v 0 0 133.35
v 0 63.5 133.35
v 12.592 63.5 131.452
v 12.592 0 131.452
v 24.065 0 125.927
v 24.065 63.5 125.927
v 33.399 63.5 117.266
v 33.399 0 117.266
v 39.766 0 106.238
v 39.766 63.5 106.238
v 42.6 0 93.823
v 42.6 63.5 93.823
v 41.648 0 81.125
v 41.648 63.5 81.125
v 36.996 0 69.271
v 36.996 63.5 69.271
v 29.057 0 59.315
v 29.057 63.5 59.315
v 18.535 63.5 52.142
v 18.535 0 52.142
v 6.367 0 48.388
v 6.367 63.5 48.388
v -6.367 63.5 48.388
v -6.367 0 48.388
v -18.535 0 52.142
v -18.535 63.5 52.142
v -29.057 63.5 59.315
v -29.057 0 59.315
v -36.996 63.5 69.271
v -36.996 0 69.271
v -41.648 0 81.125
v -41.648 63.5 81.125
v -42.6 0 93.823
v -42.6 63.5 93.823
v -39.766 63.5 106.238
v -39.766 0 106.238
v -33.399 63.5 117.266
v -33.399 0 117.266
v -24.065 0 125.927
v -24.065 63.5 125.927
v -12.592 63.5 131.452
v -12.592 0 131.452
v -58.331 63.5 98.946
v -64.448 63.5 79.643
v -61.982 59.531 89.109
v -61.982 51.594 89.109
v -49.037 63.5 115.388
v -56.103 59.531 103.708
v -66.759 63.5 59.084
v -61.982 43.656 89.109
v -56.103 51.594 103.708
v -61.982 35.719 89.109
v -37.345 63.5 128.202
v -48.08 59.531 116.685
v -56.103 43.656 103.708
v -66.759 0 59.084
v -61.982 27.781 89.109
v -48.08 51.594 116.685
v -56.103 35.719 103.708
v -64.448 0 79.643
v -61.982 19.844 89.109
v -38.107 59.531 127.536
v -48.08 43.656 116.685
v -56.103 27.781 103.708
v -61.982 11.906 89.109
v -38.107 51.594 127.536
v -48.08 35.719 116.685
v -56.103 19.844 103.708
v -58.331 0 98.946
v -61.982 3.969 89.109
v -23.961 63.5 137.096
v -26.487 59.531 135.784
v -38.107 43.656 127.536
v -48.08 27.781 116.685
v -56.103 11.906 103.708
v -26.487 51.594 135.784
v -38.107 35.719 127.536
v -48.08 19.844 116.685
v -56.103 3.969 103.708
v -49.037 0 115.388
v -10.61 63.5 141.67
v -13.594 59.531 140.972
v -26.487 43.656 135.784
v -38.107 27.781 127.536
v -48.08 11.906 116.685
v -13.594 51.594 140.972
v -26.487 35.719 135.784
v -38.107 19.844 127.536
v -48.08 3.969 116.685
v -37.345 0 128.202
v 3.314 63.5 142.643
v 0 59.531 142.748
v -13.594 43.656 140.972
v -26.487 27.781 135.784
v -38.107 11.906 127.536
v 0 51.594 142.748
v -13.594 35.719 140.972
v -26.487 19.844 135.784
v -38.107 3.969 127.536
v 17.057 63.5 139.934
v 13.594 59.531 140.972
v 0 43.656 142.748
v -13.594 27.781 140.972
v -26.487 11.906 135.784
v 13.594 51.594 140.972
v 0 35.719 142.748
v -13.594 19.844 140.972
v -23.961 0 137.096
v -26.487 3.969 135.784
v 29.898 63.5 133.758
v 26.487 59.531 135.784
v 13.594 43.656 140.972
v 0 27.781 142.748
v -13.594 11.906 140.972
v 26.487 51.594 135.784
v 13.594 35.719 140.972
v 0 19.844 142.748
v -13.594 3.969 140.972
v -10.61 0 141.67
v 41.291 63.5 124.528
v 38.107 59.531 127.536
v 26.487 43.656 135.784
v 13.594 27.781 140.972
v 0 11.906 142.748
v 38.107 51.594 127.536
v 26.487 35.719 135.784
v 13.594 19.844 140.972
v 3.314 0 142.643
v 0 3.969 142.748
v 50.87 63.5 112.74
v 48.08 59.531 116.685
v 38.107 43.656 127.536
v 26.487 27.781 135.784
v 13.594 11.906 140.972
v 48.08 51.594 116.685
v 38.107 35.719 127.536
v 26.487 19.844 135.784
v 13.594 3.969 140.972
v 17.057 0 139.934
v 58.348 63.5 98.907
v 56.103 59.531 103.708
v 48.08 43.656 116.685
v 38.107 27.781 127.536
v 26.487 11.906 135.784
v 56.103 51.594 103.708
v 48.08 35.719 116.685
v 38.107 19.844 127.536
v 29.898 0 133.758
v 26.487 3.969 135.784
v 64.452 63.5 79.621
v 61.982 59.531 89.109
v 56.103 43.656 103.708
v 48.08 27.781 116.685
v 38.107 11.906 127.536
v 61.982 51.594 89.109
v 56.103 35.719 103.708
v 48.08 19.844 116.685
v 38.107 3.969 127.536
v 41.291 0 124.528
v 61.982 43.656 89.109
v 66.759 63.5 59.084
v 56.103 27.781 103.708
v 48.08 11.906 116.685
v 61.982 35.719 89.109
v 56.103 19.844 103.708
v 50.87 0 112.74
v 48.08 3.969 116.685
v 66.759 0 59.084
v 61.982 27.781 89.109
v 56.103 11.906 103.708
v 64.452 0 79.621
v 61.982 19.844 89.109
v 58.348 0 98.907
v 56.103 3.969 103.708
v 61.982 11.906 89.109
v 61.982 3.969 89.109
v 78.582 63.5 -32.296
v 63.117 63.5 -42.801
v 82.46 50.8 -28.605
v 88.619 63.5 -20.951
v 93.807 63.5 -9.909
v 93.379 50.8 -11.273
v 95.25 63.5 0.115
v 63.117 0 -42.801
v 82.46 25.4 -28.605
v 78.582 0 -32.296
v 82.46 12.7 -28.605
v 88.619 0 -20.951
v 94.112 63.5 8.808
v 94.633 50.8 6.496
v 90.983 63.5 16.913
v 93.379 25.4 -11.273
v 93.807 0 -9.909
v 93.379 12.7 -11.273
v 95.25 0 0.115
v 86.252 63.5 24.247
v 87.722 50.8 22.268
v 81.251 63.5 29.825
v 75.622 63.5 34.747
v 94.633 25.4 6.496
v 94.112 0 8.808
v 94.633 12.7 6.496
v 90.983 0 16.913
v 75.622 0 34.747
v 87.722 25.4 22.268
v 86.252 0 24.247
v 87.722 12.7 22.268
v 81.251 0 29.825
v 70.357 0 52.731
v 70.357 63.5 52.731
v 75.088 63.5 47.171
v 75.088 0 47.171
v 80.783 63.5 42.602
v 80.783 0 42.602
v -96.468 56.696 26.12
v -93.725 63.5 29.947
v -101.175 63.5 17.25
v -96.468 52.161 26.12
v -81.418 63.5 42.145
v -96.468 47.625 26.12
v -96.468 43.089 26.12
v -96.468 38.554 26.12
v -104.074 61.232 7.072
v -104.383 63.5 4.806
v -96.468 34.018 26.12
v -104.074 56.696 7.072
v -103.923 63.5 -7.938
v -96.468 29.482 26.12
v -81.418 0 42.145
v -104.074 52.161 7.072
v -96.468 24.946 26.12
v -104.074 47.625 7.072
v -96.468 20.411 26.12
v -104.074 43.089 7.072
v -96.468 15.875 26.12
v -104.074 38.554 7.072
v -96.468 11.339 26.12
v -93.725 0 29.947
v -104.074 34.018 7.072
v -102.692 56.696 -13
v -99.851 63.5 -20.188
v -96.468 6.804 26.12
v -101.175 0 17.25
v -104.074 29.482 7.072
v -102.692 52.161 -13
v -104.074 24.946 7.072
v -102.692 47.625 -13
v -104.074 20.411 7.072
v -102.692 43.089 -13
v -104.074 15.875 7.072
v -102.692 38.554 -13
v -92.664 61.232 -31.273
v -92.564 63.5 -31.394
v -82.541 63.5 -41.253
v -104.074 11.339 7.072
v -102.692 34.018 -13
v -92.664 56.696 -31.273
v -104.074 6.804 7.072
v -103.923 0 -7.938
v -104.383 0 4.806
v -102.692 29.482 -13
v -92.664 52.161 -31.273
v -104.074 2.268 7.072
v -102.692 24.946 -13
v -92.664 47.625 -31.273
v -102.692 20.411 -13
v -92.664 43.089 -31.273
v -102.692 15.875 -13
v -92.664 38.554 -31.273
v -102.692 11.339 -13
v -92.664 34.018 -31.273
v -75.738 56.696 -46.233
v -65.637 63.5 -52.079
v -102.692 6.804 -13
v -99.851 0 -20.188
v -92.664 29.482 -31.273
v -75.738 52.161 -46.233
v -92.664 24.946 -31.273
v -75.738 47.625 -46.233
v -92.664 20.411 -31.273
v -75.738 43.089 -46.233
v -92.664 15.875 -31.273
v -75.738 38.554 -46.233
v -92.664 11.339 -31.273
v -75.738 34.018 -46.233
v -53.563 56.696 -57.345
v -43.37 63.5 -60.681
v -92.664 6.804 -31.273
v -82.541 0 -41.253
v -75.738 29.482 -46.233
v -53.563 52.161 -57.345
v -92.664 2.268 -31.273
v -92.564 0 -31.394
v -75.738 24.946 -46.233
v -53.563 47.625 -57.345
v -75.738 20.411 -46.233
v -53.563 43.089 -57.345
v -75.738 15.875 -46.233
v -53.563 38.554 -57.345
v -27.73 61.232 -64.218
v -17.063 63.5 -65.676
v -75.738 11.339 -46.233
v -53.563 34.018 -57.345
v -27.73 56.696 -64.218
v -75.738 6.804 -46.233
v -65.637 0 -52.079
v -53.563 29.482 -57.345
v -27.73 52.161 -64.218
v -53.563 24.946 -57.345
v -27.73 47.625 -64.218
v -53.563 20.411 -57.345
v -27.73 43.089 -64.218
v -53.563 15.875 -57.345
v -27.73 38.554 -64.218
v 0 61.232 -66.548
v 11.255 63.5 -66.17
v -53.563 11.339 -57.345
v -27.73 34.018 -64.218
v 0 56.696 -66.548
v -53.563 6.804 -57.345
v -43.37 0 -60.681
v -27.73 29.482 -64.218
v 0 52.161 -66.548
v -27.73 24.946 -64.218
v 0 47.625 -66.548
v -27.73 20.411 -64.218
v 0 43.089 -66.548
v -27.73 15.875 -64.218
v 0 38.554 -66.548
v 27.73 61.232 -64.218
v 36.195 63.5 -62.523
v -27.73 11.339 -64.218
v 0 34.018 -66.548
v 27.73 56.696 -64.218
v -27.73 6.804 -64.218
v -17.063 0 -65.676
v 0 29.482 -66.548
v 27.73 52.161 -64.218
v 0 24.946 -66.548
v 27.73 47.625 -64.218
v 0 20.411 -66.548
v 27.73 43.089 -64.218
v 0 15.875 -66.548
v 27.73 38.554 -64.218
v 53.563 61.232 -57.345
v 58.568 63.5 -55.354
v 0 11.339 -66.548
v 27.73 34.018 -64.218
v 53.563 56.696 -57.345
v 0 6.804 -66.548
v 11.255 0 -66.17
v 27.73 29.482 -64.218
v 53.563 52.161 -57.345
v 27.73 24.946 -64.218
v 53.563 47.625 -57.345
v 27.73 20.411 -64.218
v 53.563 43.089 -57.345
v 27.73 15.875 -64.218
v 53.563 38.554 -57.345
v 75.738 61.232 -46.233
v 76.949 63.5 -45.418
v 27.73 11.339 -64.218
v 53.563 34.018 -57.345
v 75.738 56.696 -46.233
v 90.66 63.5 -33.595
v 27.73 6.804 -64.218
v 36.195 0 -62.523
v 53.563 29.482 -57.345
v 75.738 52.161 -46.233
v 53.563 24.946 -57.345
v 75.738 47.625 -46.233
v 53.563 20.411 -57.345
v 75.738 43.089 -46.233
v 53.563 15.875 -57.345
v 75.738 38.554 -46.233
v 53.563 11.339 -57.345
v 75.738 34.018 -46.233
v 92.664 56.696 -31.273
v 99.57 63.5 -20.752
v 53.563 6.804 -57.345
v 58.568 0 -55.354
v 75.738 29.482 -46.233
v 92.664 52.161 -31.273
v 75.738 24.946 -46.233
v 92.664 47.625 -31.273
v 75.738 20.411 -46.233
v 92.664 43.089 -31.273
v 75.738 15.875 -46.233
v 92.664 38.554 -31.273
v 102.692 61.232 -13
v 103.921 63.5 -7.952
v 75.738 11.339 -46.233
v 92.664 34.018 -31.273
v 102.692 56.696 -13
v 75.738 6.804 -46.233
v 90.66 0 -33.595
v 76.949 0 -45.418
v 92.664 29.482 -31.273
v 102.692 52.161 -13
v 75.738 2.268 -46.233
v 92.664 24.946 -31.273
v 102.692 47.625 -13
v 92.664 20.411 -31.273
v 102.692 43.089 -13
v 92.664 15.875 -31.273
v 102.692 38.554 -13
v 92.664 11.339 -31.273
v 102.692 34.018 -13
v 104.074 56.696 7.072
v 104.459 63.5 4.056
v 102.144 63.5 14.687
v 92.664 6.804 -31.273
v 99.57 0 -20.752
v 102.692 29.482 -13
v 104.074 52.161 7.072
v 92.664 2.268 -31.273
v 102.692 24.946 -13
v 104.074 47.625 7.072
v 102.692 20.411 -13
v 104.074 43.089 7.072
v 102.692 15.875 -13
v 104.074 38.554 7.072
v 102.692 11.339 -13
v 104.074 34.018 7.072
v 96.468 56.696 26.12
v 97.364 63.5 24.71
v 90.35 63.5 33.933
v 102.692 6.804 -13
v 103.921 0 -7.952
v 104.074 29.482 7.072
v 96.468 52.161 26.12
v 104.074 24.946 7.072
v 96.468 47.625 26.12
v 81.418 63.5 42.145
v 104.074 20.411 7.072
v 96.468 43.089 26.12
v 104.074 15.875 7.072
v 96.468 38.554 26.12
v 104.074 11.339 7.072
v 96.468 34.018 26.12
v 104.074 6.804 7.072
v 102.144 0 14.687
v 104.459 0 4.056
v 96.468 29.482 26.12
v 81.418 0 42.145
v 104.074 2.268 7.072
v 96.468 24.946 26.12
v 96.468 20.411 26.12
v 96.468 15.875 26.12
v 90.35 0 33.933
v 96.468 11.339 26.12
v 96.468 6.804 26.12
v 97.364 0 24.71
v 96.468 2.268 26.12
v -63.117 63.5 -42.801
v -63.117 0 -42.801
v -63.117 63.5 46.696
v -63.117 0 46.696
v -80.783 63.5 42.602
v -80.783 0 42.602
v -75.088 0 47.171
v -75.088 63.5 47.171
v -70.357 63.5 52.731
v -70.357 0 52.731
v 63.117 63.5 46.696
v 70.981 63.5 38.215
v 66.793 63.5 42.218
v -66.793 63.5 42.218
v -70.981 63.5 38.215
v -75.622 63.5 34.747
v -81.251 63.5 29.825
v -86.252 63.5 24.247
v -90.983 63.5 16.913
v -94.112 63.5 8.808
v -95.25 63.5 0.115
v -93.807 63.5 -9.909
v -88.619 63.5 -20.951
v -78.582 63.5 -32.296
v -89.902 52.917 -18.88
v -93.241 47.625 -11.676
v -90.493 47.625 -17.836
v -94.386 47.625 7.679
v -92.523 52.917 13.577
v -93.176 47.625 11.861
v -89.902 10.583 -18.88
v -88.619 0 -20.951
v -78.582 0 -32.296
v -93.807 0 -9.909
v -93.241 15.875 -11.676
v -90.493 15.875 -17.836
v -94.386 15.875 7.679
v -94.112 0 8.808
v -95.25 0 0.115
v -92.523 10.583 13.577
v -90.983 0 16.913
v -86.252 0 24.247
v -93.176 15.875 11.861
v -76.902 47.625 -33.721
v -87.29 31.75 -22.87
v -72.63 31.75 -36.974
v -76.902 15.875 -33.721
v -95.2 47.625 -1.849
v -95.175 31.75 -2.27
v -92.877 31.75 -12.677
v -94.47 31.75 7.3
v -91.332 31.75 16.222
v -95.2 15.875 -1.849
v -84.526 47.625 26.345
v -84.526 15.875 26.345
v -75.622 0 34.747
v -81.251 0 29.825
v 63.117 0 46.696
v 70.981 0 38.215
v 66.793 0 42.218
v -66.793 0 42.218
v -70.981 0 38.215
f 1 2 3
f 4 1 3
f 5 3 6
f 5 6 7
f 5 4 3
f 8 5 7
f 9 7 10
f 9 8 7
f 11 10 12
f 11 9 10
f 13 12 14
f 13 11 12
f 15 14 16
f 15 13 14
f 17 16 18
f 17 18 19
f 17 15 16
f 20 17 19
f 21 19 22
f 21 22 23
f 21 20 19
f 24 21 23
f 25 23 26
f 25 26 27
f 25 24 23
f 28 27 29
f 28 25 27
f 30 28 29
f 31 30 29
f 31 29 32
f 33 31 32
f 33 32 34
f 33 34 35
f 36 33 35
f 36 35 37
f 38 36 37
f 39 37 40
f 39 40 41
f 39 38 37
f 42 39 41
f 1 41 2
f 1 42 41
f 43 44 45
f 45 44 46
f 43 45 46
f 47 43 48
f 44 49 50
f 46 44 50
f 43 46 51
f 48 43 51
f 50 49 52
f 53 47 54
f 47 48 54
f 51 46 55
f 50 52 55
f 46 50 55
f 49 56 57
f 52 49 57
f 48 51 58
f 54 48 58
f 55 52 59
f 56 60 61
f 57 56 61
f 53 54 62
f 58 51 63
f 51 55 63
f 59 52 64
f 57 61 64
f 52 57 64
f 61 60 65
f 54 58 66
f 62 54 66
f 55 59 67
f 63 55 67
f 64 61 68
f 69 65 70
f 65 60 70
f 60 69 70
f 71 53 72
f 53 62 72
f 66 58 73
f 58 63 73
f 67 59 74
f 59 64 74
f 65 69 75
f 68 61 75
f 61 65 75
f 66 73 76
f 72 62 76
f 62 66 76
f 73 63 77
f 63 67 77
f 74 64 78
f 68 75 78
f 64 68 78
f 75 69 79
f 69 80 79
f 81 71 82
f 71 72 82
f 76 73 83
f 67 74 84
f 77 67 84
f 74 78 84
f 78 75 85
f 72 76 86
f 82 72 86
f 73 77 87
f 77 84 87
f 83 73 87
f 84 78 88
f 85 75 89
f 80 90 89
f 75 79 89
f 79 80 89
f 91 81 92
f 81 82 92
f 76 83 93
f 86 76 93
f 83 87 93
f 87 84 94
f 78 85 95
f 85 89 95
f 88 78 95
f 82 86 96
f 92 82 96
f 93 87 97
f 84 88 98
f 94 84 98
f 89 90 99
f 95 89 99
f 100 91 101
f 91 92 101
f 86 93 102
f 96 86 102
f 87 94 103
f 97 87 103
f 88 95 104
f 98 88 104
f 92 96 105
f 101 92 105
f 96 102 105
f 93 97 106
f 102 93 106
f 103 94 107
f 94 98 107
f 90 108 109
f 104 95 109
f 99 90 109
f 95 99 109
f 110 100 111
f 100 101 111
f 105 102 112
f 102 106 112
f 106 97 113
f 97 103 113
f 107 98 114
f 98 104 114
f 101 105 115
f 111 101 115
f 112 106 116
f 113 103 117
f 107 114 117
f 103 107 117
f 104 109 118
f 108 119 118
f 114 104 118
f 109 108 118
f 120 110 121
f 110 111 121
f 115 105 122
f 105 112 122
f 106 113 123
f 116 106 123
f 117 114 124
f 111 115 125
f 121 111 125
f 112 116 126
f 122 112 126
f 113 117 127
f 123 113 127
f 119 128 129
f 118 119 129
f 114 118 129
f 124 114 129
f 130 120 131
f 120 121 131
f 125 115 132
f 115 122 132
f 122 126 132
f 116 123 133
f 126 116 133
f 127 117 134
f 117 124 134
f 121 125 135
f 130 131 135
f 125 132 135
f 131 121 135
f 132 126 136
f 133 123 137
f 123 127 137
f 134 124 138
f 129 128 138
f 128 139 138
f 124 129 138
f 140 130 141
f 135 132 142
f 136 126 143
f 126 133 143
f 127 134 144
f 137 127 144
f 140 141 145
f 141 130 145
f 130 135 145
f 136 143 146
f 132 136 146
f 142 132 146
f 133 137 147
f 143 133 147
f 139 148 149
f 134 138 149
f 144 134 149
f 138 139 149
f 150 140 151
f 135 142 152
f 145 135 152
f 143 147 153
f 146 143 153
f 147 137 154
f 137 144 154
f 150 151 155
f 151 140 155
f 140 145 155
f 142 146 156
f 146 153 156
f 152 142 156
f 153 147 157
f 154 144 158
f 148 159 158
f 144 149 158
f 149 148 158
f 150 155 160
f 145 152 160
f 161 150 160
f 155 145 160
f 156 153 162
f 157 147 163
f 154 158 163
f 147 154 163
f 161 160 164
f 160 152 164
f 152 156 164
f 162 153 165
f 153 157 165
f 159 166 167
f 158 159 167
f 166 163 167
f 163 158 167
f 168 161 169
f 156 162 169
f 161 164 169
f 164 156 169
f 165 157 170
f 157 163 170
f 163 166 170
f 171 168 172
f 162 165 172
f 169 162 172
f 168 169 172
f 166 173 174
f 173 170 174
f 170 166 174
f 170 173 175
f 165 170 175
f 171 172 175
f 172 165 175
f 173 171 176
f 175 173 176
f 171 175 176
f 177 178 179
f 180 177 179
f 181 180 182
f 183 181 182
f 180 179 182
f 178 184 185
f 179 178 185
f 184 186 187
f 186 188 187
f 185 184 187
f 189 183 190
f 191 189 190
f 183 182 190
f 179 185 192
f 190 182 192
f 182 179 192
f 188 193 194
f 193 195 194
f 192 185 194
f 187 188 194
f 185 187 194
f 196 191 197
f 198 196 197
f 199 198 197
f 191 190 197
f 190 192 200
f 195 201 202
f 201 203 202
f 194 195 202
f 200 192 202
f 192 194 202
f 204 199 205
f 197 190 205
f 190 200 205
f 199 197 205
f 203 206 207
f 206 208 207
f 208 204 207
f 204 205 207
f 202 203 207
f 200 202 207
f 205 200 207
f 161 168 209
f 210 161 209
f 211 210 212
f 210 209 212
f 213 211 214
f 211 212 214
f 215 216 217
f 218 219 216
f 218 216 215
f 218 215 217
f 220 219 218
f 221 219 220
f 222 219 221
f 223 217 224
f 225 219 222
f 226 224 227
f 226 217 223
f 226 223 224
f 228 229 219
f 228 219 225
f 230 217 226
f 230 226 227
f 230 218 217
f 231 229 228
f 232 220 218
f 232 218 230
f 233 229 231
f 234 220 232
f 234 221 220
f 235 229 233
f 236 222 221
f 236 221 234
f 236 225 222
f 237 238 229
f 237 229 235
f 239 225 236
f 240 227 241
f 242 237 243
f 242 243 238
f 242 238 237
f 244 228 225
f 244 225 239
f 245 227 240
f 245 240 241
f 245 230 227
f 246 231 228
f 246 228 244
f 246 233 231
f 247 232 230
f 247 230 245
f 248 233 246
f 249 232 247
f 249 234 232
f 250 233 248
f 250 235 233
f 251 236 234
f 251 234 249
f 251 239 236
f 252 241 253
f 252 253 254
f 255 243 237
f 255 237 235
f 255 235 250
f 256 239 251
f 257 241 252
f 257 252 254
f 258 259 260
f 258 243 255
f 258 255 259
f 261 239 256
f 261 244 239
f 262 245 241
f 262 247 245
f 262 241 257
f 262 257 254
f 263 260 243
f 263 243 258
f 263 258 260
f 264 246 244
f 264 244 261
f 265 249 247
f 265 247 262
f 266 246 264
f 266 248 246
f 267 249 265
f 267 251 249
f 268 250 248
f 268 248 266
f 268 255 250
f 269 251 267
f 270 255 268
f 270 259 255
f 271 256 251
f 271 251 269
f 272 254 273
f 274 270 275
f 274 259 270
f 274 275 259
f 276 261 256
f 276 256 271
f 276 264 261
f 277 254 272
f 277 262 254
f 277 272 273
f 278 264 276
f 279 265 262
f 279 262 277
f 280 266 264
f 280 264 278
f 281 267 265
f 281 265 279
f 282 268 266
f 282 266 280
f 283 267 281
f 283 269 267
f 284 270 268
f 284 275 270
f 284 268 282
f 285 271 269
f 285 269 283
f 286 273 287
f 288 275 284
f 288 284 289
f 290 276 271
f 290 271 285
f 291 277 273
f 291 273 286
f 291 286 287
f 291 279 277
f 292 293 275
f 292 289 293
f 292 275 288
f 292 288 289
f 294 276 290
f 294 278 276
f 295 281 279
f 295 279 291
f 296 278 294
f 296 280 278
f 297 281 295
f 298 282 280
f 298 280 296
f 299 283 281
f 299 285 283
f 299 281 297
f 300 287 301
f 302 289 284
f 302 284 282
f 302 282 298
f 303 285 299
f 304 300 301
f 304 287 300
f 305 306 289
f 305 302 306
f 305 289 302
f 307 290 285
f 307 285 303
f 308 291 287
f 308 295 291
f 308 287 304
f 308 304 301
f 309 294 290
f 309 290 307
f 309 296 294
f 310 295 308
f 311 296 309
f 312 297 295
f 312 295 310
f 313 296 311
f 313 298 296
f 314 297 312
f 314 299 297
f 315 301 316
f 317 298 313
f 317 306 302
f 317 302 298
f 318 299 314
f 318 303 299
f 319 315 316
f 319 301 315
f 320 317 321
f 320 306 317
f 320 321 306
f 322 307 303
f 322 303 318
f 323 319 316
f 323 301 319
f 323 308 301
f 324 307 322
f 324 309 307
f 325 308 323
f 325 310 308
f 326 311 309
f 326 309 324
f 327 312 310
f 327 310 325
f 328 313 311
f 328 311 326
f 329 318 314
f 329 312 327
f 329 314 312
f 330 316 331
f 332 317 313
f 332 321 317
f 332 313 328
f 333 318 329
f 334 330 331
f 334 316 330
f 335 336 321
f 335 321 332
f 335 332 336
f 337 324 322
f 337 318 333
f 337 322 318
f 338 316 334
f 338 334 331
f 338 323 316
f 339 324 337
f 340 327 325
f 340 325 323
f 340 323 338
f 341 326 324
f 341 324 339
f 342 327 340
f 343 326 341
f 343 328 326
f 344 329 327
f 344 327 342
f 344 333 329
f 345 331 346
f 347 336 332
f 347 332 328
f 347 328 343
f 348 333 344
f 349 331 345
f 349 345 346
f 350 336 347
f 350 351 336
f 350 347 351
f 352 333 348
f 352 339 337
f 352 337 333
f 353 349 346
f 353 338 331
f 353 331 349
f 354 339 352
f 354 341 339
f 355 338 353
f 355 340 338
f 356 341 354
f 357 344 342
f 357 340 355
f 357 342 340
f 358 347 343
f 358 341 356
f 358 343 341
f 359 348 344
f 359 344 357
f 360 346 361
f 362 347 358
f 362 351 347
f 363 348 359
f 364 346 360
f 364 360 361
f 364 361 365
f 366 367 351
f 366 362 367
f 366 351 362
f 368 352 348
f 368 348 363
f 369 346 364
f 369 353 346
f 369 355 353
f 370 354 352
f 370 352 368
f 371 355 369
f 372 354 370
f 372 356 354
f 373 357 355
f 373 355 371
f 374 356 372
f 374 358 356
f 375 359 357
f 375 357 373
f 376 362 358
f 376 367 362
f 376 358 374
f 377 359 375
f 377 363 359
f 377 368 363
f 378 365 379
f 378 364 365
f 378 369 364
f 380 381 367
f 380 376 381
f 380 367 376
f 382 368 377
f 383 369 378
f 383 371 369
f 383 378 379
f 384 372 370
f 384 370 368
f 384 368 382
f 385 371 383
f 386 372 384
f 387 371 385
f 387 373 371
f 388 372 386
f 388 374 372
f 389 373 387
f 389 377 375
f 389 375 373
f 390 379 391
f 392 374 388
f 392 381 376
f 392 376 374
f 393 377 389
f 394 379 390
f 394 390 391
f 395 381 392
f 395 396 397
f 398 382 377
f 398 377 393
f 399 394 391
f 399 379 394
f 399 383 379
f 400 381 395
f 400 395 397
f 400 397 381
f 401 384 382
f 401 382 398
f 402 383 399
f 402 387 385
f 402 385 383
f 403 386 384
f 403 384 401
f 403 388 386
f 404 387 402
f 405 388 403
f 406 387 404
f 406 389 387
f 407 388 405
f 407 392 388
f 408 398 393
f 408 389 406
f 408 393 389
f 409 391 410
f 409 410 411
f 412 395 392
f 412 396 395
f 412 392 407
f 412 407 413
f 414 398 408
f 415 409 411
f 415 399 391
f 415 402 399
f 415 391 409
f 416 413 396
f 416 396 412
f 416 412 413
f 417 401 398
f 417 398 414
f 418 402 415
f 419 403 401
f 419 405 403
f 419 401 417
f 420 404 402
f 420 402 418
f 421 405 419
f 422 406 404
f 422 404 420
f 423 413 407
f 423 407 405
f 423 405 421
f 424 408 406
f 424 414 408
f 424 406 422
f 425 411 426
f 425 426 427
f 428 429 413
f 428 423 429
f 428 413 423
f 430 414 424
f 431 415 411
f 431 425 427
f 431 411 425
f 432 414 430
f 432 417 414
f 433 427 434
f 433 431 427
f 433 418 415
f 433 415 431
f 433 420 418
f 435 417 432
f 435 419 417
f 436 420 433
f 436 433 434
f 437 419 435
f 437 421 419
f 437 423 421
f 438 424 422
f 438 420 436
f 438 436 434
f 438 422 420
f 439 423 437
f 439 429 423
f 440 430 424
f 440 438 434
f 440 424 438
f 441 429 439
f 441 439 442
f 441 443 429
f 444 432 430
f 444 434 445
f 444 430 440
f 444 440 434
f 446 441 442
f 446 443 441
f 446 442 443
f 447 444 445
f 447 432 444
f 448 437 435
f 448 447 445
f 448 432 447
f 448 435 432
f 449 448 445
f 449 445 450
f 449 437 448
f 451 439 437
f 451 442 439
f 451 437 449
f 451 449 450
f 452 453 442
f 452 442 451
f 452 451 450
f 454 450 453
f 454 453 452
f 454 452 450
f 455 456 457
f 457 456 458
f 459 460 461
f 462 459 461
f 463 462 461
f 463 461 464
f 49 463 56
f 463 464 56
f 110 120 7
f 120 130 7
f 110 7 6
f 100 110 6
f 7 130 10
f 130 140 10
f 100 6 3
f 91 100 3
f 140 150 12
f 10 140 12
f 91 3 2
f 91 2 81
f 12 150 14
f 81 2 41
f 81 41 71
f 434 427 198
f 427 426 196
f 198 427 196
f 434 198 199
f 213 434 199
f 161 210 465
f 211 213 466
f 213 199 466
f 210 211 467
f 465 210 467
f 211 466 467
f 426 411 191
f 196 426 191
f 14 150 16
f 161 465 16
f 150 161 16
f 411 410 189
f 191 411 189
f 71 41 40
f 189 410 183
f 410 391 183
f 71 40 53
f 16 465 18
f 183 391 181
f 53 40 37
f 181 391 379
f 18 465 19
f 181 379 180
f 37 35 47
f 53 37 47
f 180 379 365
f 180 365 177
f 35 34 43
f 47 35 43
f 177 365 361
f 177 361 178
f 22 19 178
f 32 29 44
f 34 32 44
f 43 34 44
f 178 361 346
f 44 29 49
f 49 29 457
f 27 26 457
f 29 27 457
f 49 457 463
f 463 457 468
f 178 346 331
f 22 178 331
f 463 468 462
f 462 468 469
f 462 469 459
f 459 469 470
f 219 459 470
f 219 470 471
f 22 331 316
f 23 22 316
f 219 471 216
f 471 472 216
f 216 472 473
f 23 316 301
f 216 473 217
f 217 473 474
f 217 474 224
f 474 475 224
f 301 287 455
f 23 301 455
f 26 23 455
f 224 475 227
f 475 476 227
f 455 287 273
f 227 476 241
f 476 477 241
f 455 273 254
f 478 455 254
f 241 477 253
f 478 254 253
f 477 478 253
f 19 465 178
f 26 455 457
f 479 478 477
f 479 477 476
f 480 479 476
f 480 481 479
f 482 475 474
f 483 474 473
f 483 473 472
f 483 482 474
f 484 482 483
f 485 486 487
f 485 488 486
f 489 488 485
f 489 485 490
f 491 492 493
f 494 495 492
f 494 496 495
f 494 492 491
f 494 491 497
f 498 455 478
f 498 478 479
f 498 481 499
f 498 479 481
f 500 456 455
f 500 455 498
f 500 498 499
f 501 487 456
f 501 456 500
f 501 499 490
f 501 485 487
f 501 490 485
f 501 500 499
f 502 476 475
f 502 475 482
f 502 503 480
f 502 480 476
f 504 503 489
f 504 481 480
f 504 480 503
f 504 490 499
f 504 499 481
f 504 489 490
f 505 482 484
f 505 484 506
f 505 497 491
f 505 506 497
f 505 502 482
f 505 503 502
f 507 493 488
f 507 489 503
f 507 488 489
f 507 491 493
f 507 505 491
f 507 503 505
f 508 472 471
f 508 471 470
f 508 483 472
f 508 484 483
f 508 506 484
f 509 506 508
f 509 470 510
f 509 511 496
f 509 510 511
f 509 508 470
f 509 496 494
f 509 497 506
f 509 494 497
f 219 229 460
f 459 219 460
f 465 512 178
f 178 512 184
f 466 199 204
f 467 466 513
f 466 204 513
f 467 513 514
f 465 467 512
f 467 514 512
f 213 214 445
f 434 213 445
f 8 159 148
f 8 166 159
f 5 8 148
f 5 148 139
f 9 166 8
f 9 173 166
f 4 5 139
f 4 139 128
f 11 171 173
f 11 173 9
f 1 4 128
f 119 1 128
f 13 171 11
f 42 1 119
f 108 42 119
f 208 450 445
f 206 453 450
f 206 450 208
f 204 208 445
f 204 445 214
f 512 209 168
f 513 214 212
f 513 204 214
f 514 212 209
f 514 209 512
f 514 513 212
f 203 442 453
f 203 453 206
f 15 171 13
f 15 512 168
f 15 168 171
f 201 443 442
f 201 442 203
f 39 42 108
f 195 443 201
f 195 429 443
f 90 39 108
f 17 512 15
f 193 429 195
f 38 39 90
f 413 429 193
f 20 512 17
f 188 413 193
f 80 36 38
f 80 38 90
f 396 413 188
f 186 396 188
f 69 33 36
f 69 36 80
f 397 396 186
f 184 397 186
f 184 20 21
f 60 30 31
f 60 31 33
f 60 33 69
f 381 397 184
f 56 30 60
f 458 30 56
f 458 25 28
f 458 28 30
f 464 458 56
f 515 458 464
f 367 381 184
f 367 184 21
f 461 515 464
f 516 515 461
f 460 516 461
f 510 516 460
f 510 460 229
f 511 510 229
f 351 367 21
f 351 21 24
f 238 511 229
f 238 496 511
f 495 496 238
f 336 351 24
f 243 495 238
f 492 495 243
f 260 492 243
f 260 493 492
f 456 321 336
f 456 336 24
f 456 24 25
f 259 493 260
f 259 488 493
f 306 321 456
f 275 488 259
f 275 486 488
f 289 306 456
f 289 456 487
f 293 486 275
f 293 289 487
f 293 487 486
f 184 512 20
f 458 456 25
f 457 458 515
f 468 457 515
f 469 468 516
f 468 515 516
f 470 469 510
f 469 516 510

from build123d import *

# Parameters (mm, degrees)
SKETCH2_R           = 42.719462629
BOSS_EXTRUDE1_DEPTH = 63.5


with BuildPart() as part:
    # Sketch2 → Boss-Extrude1 (new body)
    with BuildSketch(Plane(origin=(0, 0, 0), x_dir=(1, 0, 0), z_dir=(0, 1, 0))):
        with BuildLine():
            add(Edge.make_bspline(
                [(-81.418271406, -42.145271175), (-82.170892978, -41.555605689), (-83.661947513, -40.34468266), (-86.504917126, -37.858902664), (-89.826106451, -34.605614461), (-93.402448477, -30.484129949), (-97.592609956, -24.708725497), (-101.670899734, -16.994783744), (-104.458923138, -7.121149558), (-104.935398087, 3.044819843), (-102.433523024, 16.436187317), (-93.803088458, 31.852958892), (-76.611247213, 46.872704612), (-54.178867472, 58.053706434), (-28.050376191, 64.98110667), (0, 67.331446665), (28.050376191, 64.98110667), (54.178867472, 58.053706434), (76.611247213, 46.872704612), (93.803088458, 31.852958892), (102.433523024, 16.436187317), (104.935398087, 3.044819843), (104.458923138, -7.121149558), (101.670899734, -16.994783744), (97.592609956, -24.708725497), (93.402448477, -30.484129949), (89.826106451, -34.605614461), (86.504917126, -37.858902664), (83.661947513, -40.34468266), (82.170892978, -41.555605689), (81.418271406, -42.145271175)],
                knots=[-0.653544264, -0.653544264, -0.653544264, -0.653544264, -0.618788942, -0.58403362, -0.514522977, -0.445012334, -0.37550169, -0.236480403, -0.097459116, 0.041562171, 0.180583458, 0.458626031, 0.736668605, 1.014711179, 1.292753753, 1.570796327, 1.848838901, 2.126881474, 2.404924048, 2.682966622, 2.961009196, 3.100030483, 3.23905177, 3.378073057, 3.517094344, 3.586604987, 3.656115631, 3.725626274, 3.760381596, 3.795136918, 3.795136918, 3.795136918, 3.795136918], degree=3))
            Line((-81.418271406, -42.145271175), (-80.782524238, -42.60195459))
            ThreePointArc((-80.782524238, -42.60195459), (-72.590288115, -49.838688832), (-66.759034423, -59.084203181))
            add(Edge.make_bspline(
                [(-66.759034423, -59.084203181), (-66.756215175, -59.24536099), (-66.661656556, -64.048566295), (-65.790713621, -74.286669871), (-62.365697816, -89.290962144), (-56.461216886, -103.979945176), (-45.725258503, -121.392835835), (-31.037649258, -134.546769237), (-13.714508461, -141.546891793), (0, -143.348554103), (13.714508461, -141.546891793), (31.037649258, -134.546769237), (45.725258503, -121.392835835), (56.461216886, -103.979945176), (62.365697816, -89.290962144), (65.790713621, -74.286669871), (66.661656556, -64.048566295), (66.756215175, -59.24536099), (66.759034423, -59.084203181)],
                knots=[-1.547568222, -1.547568222, -1.547568222, -1.547568222, -1.541761196, -1.374446786, -1.178097245, -0.981747704, -0.785398163, -0.392699082, -0.196349541, 0, 0.196349541, 0.392699082, 0.785398163, 0.981747704, 1.178097245, 1.374446786, 1.541761196, 1.547568222, 1.547568222, 1.547568222, 1.547568222], degree=3))
            ThreePointArc((66.759034423, -59.084203181), (72.590288115, -49.838688832), (80.782524238, -42.60195459))
            Line((80.782524238, -42.60195459), (81.418271406, -42.145271175))
        make_face()
        with BuildLine():
            Line((-63.117151263, 42.801443643), (-63.117151263, -46.696050008))
            ThreePointArc((-63.117151263, -46.696050008), (-68.826389344, -40.153156206), (-75.622200408, -34.74743602))
            add(Edge.make_bspline(
                [(-63.117151263, 42.801443643), (-129.572781961, 7.521875813), (-75.622200408, -34.74743602)],
                knots=[5.473145987, 5.473145987, 5.473145987, 6.936729571, 6.936729571, 6.936729571], degree=2, weights=[0.749177169, 0.633315632, 1]))
        make_face(mode=Mode.SUBTRACT)
        with BuildLine():
            add(Edge.make_bspline(
                [(63.117151263, 42.801443643), (85.588412535, 30.872034834), (103.059743747, 11.866002701), (100.457712976, -8.676182438), (89.289299072, -24.039509643), (75.622200408, -34.74743602)],
                knots=[5.473145987, 5.473145987, 5.473145987, 5.473145987, 5.473145987, 5.473145987, 6.936729571, 6.936729571, 6.936729571, 6.936729571, 6.936729571, 6.936729571], degree=5, weights=[1, 1, 0.972678032, 0.989522952, 1, 1]))
            ThreePointArc((75.622200408, -34.74743602), (68.826389344, -40.153156206), (63.117151263, -46.696050008))
            Line((63.117151263, -46.696050008), (63.117151263, 42.801443643))
        make_face(mode=Mode.SUBTRACT)
        with Locations(Location((0, -90.630537371, 0), (0, 0, 270))):
            Circle(SKETCH2_R, mode=Mode.SUBTRACT)
    extrude(amount=BOSS_EXTRUDE1_DEPTH)


solid = part.part
